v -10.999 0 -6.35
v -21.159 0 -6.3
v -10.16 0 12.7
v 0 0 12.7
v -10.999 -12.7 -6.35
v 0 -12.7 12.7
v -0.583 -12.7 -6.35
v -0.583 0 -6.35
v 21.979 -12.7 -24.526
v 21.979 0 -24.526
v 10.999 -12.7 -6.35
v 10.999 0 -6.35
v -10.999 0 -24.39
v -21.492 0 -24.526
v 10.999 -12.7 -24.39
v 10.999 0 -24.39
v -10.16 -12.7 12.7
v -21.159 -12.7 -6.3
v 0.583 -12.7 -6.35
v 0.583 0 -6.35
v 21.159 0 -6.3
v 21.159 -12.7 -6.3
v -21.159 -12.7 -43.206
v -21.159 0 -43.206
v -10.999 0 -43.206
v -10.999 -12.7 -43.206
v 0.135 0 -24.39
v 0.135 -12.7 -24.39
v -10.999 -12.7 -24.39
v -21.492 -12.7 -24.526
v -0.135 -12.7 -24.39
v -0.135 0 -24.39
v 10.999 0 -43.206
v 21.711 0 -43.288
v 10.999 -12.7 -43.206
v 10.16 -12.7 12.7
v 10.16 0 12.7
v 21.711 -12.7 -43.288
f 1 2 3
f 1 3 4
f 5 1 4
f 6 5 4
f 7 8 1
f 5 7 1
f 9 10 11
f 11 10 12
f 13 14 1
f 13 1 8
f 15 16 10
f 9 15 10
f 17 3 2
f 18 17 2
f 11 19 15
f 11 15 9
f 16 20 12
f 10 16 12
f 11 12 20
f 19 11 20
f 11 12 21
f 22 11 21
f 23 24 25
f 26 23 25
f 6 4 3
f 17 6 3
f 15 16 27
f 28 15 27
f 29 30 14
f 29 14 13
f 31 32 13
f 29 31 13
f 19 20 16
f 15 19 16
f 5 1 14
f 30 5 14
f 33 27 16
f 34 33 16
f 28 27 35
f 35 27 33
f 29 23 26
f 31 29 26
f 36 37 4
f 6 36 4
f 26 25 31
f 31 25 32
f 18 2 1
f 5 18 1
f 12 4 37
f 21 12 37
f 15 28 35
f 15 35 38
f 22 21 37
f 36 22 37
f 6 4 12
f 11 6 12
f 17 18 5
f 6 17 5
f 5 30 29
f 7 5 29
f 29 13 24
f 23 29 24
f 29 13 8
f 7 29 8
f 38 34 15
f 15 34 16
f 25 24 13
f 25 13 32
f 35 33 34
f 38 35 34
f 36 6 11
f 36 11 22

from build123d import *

# Parameters (mm, degrees)
F1_DEPTH = 12.7


# Not quite as in the source:
# - a length typed as a fraction of an inch, garbled in the dataset ("3 / 203.2 mm" for 3/8 in), is restored


with BuildPart() as f1:
    # F0 (on Front) → F1 (new body)
    with BuildSketch(Plane.XZ):
        Polygon((-10.9985226281, -6.35), (0, 12.7), (-10.16, 12.7), (-21.1585226281, -6.2996095111), align=None)
    extrude(amount=F1_DEPTH)


with BuildPart() as f1b:
    # F0 (on Front) → F1, piece 2 (new body)
    with BuildSketch(Plane.XZ):
        Polygon((10.16, 12.7), (0, 12.7), (10.9985226281, -6.35), (21.1585226281, -6.2996095111), align=None)
    extrude(amount=F1_DEPTH)


with BuildPart() as f1c:
    # F0 (on Front) → F1, piece 3 (new body)
    with BuildSketch(Plane.XZ):
        Polygon((-0.5832433259, -6.35), (-10.9985226281, -6.35), (-21.4922550901, -24.5256777853), (-10.9985226281, -24.3897929265), align=None)
    extrude(amount=F1_DEPTH)


with BuildPart() as f1d:
    # F0 (on Front) → F1, piece 4 (new body)
    with BuildSketch(Plane.XZ):
        Polygon((21.9792984426, -24.5256777853), (10.9985226281, -6.35), (0.5832433259, -6.35), (10.9985226281, -24.3897929265), align=None)
    extrude(amount=F1_DEPTH)


with BuildPart() as f1e:
    # F0 (on Front) → F1, piece 5 (new body)
    with BuildSketch(Plane.XZ):
        Polygon((-0.1352517672, -24.3897929265), (-10.9985226281, -24.3897929265), (-21.1585226281, -43.2055299938), (-10.9985226281, -43.2055299938), align=None)
    extrude(amount=F1_DEPTH)


with BuildPart() as f1f:
    # F0 (on Front) → F1, piece 6 (new body)
    with BuildSketch(Plane.XZ):
        Polygon((21.7112582177, -43.2884916663), (10.9985226281, -24.3897929265), (0.1352517672, -24.3897929265), (10.9985226281, -43.2055299938), align=None)
    extrude(amount=F1_DEPTH)


solid = Compound([f1.part, f1b.part, f1c.part, f1d.part, f1e.part, f1f.part])
